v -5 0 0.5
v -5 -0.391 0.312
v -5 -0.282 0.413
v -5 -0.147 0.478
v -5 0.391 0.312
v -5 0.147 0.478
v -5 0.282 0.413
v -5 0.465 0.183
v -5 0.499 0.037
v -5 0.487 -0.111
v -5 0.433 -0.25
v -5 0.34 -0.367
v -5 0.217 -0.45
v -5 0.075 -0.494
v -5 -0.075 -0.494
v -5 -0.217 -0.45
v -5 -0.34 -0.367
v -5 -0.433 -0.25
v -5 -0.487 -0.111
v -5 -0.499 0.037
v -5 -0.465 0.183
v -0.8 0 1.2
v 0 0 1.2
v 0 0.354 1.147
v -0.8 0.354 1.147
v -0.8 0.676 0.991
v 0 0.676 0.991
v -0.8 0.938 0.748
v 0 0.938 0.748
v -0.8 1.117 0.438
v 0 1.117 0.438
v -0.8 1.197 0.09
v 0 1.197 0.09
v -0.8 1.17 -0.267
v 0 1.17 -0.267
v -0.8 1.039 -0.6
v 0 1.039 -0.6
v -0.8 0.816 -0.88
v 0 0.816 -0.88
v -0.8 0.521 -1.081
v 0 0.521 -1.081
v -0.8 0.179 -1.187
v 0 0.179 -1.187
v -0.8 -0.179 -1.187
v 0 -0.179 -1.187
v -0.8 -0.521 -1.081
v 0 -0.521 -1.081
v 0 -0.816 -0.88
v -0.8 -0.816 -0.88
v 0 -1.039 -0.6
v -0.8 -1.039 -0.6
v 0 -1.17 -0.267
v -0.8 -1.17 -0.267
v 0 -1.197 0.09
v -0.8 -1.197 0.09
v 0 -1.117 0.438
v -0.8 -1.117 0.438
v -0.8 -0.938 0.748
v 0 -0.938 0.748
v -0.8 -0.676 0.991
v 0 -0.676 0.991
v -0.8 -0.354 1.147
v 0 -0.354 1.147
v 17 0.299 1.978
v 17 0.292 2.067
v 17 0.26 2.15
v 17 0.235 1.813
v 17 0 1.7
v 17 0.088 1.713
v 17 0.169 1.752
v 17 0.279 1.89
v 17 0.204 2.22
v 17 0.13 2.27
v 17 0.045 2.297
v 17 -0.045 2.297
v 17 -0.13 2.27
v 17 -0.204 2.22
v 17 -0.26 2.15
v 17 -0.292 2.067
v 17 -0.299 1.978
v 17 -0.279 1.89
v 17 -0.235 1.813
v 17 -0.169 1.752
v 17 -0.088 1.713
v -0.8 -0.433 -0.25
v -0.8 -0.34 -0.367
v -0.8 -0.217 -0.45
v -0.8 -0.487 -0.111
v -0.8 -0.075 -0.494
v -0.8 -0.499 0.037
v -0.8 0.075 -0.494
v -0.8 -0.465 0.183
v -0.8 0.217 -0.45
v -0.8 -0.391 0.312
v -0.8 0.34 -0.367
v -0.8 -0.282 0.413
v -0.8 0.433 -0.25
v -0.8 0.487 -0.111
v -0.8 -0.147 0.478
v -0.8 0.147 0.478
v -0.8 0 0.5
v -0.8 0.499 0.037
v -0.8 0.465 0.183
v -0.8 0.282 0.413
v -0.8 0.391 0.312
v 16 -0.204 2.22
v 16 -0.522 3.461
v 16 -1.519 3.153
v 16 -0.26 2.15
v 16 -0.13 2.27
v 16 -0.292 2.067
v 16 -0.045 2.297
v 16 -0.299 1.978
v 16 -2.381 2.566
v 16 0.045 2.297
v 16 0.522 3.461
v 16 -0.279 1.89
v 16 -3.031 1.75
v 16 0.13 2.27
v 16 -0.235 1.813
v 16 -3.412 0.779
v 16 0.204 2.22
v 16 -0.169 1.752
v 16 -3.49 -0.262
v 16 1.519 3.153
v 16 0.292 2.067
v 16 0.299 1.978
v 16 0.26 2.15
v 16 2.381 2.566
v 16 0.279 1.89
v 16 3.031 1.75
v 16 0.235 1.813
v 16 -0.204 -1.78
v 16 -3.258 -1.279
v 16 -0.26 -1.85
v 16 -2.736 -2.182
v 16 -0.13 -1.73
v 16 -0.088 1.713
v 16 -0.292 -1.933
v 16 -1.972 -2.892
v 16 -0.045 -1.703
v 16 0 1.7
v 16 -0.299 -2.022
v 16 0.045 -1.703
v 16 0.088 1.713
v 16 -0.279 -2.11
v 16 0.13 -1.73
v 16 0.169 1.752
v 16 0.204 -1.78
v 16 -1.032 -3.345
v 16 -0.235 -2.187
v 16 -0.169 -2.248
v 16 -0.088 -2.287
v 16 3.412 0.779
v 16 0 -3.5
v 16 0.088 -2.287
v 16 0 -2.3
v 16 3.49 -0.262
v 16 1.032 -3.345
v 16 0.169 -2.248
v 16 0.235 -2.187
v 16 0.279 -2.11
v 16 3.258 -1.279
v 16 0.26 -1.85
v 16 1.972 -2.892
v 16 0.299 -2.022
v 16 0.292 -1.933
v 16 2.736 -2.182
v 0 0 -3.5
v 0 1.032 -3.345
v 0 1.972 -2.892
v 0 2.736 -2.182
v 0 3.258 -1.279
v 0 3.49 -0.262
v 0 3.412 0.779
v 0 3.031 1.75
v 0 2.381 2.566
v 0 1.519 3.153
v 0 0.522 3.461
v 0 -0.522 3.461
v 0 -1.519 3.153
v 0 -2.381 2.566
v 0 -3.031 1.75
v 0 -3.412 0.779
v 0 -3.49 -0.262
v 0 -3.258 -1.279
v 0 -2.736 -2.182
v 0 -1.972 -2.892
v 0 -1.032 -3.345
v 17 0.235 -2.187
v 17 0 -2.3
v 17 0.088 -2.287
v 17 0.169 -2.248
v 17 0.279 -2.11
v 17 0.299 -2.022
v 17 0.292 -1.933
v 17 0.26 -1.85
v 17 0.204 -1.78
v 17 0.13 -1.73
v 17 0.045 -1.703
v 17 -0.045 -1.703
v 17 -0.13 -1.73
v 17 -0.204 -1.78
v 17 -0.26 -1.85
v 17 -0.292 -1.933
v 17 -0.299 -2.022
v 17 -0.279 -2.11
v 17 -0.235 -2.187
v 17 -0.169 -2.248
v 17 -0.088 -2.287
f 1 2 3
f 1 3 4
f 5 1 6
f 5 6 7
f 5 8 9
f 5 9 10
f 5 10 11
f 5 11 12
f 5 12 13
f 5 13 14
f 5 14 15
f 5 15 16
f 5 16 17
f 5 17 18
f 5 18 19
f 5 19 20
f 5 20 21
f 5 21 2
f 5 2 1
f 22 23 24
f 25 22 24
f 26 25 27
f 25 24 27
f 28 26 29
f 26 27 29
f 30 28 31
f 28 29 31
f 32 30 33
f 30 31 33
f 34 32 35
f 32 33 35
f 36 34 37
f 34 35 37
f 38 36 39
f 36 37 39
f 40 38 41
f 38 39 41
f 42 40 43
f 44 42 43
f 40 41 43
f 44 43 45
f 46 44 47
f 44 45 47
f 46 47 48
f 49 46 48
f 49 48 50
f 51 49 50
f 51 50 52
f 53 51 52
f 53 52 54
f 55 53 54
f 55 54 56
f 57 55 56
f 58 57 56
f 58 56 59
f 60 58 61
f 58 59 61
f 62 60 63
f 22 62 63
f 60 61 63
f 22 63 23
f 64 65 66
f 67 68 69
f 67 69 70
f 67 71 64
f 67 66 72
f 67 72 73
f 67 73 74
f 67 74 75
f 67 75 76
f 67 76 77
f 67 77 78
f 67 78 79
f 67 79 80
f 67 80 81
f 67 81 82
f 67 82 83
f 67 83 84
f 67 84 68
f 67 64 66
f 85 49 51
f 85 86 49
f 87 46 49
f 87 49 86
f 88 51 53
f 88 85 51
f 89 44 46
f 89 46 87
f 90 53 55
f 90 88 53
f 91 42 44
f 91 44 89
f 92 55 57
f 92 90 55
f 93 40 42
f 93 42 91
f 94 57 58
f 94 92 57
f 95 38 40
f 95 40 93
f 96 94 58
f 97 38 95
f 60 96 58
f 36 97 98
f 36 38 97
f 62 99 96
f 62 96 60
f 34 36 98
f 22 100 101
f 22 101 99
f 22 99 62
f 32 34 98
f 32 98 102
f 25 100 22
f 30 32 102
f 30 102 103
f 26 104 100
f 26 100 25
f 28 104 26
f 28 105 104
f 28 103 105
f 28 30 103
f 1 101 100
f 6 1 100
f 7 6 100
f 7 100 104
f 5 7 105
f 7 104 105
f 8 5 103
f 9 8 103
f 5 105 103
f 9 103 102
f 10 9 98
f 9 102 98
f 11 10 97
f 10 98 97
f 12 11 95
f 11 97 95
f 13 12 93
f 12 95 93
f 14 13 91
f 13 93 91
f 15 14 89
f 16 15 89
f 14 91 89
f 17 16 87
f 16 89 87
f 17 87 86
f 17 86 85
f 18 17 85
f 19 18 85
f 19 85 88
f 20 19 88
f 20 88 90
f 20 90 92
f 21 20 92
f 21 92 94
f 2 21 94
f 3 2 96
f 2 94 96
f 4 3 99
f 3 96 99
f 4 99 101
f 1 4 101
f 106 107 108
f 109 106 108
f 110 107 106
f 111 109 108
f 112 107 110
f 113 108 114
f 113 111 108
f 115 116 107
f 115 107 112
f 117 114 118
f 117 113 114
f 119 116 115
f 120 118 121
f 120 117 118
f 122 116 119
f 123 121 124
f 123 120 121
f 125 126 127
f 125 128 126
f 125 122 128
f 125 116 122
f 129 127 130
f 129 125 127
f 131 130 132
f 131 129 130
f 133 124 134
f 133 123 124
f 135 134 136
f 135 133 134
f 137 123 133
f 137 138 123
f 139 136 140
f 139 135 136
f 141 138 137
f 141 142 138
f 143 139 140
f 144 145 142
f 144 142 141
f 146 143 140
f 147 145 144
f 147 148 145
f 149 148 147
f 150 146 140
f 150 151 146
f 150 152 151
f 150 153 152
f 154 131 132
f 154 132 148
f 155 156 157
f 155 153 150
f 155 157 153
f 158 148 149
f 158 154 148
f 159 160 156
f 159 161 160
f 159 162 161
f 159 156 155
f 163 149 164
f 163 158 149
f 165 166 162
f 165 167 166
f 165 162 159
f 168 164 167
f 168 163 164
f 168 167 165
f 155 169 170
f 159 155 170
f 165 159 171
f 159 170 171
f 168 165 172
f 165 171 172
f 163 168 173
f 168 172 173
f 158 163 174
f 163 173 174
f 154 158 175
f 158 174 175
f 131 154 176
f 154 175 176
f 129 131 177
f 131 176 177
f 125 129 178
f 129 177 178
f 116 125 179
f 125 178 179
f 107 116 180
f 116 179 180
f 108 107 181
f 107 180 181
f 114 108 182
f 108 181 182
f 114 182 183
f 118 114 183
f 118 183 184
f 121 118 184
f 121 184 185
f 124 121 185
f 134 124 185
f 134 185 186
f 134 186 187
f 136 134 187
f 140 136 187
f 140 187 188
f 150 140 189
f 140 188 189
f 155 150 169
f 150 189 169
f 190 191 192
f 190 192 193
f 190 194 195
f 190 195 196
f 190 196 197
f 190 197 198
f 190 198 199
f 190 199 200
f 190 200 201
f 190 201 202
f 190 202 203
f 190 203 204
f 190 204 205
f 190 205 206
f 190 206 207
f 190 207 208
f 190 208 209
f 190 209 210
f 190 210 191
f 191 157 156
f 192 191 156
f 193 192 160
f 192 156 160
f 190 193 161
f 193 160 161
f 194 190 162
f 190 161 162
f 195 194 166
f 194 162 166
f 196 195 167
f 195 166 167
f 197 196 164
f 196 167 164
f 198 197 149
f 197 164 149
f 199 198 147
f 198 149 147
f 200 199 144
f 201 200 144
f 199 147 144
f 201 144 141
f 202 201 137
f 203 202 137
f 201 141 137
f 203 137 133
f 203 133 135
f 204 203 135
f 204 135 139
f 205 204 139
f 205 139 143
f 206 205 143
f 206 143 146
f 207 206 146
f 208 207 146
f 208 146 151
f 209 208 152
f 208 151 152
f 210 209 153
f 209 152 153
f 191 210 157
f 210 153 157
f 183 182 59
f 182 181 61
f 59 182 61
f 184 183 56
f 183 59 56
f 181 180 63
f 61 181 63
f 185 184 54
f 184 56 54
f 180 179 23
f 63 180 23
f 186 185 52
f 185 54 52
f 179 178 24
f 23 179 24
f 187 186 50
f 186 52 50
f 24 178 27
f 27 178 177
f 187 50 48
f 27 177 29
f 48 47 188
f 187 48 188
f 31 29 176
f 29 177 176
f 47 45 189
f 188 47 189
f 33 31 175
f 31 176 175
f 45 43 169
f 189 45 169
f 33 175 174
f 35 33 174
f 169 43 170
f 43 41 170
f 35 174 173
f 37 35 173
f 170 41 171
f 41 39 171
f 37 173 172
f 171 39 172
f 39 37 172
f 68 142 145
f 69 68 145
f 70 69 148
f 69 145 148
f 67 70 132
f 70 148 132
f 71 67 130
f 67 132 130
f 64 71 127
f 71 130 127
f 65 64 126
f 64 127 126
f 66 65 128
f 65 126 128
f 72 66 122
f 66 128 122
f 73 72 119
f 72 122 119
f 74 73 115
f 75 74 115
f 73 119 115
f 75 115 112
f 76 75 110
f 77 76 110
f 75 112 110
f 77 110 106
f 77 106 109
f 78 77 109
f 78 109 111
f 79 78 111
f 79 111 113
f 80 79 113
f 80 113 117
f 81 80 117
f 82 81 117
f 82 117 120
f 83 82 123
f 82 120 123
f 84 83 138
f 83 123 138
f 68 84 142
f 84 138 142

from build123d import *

# Parameters (mm, degrees)
SKETCH1_R           = 3.5
BOSS_EXTRUDE1_DEPTH = 16
SKETCH2_R           = 1.2
BOSS_EXTRUDE2_DEPTH = 0.8
SKETCH3_R           = 0.5
BOSS_EXTRUDE3_DEPTH = 4.2
SKETCH4_R           = 0.3
BOSS_EXTRUDE4_DEPTH = 1


with BuildPart() as part:
    # Sketch1 → Boss-Extrude1 (new body)
    with BuildSketch(Plane(origin=(0, 0, 0), x_dir=(0, 0, -1), z_dir=(1, 0, 0))):
        Circle(SKETCH1_R)
    extrude(amount=BOSS_EXTRUDE1_DEPTH)

    # Sketch2 → Boss-Extrude2 (add)
    with BuildSketch(Plane.ZY):
        Circle(SKETCH2_R)
    extrude(amount=BOSS_EXTRUDE2_DEPTH)

    # Sketch3 → Boss-Extrude3 (add)
    with BuildSketch(Plane.ZY.offset(0.8)):
        Circle(SKETCH3_R)
    extrude(amount=BOSS_EXTRUDE3_DEPTH)

    # Sketch4 → Boss-Extrude4 (add)
    with BuildSketch(Plane(origin=(16, 0, 0), x_dir=(0, 0, -1), z_dir=(1, 0, 0))):
        with Locations((-2, 0)):
            Circle(SKETCH4_R)
        with Locations((2, 0)):
            Circle(SKETCH4_R)
    extrude(amount=BOSS_EXTRUDE4_DEPTH)


solid = part.part
